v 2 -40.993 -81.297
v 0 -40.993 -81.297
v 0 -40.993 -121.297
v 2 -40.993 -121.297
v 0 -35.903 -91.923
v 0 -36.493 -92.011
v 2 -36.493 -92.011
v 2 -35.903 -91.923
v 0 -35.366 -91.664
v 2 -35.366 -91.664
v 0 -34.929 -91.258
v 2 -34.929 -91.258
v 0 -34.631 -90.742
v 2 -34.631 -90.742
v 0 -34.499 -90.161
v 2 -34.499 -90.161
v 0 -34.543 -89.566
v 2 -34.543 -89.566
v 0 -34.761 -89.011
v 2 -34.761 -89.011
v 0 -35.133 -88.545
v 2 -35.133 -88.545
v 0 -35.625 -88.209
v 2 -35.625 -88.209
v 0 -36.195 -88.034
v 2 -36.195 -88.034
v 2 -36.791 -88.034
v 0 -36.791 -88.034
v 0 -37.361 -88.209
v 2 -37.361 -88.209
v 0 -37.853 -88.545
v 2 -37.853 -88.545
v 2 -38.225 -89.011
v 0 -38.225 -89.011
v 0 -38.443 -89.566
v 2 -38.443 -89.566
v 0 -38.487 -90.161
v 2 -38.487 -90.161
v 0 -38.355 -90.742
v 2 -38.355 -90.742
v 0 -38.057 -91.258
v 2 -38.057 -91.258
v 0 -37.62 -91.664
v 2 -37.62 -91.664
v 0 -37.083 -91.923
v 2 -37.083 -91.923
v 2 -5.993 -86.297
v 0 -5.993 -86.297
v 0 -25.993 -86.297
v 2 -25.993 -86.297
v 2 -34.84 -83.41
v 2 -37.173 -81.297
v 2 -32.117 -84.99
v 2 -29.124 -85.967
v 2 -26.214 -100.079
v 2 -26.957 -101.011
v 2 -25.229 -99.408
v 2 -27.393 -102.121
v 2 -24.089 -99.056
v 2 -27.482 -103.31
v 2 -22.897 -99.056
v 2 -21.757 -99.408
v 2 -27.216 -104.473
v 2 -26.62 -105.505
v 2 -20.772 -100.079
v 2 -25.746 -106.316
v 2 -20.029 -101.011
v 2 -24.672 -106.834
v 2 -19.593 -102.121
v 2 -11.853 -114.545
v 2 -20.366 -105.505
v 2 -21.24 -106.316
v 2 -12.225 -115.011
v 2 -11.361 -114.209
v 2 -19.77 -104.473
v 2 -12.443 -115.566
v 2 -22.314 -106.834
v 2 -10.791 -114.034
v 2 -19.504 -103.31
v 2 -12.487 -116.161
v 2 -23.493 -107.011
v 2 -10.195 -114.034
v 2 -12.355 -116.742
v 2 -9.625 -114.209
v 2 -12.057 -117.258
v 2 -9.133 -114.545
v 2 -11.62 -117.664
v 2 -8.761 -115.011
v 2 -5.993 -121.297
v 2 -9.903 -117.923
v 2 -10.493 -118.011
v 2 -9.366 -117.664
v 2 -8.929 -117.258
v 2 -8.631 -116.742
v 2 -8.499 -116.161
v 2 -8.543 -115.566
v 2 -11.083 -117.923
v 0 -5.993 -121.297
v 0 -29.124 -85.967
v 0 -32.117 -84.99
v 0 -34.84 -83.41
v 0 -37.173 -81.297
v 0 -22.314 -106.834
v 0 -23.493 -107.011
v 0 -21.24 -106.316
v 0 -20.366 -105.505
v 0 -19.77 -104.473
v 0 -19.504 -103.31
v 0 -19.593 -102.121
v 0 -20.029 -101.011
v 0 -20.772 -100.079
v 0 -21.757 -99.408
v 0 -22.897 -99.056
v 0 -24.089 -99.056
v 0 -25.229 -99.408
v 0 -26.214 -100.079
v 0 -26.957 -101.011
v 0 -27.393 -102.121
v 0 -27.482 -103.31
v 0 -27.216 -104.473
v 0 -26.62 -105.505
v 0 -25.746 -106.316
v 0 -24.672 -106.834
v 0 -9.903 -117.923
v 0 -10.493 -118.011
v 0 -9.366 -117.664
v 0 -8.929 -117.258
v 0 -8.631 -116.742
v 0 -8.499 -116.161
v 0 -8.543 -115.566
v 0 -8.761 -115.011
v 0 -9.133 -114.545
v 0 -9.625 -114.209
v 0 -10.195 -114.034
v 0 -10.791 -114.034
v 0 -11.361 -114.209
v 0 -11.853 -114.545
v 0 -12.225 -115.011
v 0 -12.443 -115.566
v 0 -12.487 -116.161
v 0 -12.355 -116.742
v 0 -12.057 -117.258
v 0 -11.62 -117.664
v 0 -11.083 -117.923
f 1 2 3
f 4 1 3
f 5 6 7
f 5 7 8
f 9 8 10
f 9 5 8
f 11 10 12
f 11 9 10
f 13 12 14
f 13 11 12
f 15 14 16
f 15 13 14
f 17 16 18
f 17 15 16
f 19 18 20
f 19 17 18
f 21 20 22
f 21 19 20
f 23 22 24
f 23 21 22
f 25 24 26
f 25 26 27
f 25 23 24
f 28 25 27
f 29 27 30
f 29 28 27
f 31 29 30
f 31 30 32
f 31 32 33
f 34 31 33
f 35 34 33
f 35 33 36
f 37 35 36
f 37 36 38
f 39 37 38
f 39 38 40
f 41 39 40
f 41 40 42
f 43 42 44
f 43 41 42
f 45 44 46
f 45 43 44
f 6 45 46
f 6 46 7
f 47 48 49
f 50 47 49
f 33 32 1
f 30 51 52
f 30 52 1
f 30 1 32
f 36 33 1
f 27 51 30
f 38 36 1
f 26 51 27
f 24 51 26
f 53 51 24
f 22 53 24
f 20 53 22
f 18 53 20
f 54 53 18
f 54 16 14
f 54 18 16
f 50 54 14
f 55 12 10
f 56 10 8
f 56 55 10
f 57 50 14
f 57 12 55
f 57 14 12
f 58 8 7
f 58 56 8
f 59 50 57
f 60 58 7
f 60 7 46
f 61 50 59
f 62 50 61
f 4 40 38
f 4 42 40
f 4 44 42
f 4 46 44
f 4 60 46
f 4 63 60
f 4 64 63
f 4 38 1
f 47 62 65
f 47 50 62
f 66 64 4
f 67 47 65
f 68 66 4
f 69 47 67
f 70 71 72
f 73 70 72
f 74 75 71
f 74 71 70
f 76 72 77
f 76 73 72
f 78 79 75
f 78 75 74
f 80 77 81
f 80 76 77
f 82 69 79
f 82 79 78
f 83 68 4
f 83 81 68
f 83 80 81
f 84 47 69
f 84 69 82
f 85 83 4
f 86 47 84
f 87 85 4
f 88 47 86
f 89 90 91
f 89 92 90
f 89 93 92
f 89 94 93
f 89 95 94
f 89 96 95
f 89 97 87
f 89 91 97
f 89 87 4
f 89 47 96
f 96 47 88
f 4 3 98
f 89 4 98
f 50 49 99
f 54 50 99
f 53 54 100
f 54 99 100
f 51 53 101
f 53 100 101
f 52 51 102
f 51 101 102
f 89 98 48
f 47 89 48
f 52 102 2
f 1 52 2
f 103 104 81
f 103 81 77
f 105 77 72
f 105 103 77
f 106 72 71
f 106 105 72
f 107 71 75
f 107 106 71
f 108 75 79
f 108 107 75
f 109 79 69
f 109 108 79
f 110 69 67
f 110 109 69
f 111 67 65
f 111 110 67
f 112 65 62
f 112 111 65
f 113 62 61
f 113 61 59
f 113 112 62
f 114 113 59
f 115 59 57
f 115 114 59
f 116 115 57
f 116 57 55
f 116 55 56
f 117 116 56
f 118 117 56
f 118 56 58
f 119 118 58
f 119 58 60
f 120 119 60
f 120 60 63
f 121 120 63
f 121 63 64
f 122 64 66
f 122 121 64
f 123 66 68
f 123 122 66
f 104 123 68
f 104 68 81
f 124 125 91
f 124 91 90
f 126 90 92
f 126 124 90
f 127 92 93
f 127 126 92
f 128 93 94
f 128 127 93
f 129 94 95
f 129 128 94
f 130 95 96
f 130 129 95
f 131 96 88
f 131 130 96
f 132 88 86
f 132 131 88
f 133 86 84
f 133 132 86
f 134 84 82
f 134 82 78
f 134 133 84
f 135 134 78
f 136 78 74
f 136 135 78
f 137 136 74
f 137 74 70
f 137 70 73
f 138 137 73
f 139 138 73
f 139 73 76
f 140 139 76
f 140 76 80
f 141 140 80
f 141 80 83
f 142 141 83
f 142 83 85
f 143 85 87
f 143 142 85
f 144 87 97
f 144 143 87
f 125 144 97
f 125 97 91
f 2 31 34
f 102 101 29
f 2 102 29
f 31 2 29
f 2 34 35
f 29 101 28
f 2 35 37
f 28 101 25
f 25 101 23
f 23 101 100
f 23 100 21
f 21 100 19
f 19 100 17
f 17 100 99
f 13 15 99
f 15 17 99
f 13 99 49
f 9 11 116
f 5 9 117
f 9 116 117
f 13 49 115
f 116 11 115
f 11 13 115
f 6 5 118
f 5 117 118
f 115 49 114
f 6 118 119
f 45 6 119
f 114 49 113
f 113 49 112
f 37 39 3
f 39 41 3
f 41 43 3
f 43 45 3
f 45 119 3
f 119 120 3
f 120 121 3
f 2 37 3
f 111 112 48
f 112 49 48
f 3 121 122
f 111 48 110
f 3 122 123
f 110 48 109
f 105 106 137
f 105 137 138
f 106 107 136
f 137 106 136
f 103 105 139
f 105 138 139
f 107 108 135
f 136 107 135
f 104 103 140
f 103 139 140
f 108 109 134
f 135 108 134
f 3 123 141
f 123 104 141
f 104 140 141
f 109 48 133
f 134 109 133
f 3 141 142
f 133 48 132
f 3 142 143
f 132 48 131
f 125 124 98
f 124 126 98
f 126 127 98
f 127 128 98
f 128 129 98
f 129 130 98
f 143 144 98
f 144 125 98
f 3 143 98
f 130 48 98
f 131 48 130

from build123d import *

# Parameters (mm, degrees)
SKETCH1_R           = 4
SKETCH1_R_2         = 2
BOSS_EXTRUDE1_DEPTH = 2


with BuildPart() as part:
    # Sketch1 → Boss-Extrude1 (new body)
    with BuildSketch(Plane(origin=(0, 0, 0), x_dir=(0, 0, -1), z_dir=(1, 0, 0))):
        with BuildLine():
            Line((121.29692104, -40.99299677), (121.29692104, -5.99299677))
            Line((121.29692104, -5.99299677), (86.29692104, -5.99299677))
            Line((86.29692104, -5.99299677), (86.29692104, -25.99299677))
            ThreePointArc((86.29692104, -25.99299677), (84.989984977, -32.116721127), (81.29692104, -37.173336658))
            Line((81.29692104, -37.173336658), (81.29692104, -40.99299677))
            Line((81.29692104, -40.99299677), (121.29692104, -40.99299677))
        make_face()
        with Locations((103.011400413, -23.49299677)):
            Circle(SKETCH1_R, mode=Mode.SUBTRACT)
        with Locations((116.011400413, -10.49299677)):
            Circle(SKETCH1_R_2, mode=Mode.SUBTRACT)
        with Locations((90.011400413, -36.49299677)):
            Circle(SKETCH1_R_2, mode=Mode.SUBTRACT)
    extrude(amount=BOSS_EXTRUDE1_DEPTH)


solid = part.part
